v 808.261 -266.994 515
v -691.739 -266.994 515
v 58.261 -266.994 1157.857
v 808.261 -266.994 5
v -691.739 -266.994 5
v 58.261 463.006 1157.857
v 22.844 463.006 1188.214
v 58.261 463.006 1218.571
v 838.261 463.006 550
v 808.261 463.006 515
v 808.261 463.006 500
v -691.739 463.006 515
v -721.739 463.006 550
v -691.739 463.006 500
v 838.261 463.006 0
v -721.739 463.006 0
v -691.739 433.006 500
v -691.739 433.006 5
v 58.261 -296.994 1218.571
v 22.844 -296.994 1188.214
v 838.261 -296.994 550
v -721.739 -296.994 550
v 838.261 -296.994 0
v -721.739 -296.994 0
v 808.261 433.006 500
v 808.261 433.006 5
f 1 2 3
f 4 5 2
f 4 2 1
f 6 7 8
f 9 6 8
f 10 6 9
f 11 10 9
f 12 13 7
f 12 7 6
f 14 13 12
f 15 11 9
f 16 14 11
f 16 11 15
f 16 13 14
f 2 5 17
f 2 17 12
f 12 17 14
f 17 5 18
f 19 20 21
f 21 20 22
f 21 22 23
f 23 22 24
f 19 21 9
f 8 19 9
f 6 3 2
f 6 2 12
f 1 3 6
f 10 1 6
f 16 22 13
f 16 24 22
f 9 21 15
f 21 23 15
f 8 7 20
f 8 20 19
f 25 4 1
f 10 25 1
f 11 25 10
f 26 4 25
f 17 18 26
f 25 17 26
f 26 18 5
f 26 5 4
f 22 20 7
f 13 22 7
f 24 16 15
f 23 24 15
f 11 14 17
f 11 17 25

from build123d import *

# Parameters (mm, degrees)
SKETCH1_W           = 1560
SKETCH1_H           = 760
SKETCH1_W_2         = 1500
SKETCH1_H_2         = 700
BOSS_EXTRUDE1_DEPTH = 500
SKETCH2_W           = 1500
SKETCH2_H           = 700
BOSS_EXTRUDE2_DEPTH = 5
SKETCH5_W           = 30
SKETCH5_H           = 760
BOSS_EXTRUDE3_DEPTH = 50
CUT_EXTRUDE1_REACH  = 1260.086
SKETCH7_W           = 46.097722286
SKETCH7_H           = 760
BOSS_EXTRUDE4_DEPTH = 1709
SKETCH8_W           = 30
SKETCH8_H           = 760
BOSS_EXTRUDE5_DEPTH = 50
CUT_EXTRUDE2_REACH  = 2012.771
BOSS_EXTRUDE6_REACH = 2092.258
SKETCH11_W          = 46.097722286
SKETCH11_H          = 760
CUT_EXTRUDE4_DEPTH  = 1023
CUT_EXTRUDE5_DEPTH  = 1023
BOSS_EXTRUDE7_REACH = 1199.247
SKETCH14_W          = 1500
SKETCH14_H          = 30


with BuildPart() as part:
    # Sketch1 → Boss-Extrude1 (new body)
    with BuildSketch(Plane.XY):
        with Locations((58.260712741, 83.006069765)):
            Rectangle(SKETCH1_W, SKETCH1_H)
        with Locations((58.260712741, 83.006069765)):
            Rectangle(SKETCH1_W_2, SKETCH1_H_2, mode=Mode.SUBTRACT)
    extrude(amount=BOSS_EXTRUDE1_DEPTH)

    # Sketch2 → Boss-Extrude2 (add)
    with BuildSketch(Plane.XY):
        with Locations((58.260712741, 83.006069765)):
            Rectangle(SKETCH2_W, SKETCH2_H)
    extrude(amount=BOSS_EXTRUDE2_DEPTH)

    # Sketch5 → Boss-Extrude3 (add)
    with BuildSketch(Plane.XY.offset(500)):
        with Locations((823.260712741, 83.006069765)):
            Rectangle(SKETCH5_W, SKETCH5_H)
    extrude(amount=BOSS_EXTRUDE3_DEPTH)

    # Sketch6 → Cut-Extrude1 (cut, up to next)
    with BuildSketch(Plane(origin=(0, 463.006069765, 0), x_dir=(1, 0, 0), z_dir=(0, 1, 0)), mode=Mode.PRIVATE) as cut_extrude1_sk1:
        Polygon((838.260712741, -550), (808.260712741, -515), (808.260712741, -550), align=None)
    cut_extrude1_tool1 = extrude(cut_extrude1_sk1.sketch, amount=-CUT_EXTRUDE1_REACH, mode=Mode.PRIVATE) & part.part
    add(cut_extrude1_tool1.solids().sort_by_distance((818.260713, 463.00607, 538.333333))[0], mode=Mode.SUBTRACT)

    # Sketch7 → Boss-Extrude4 (add)
    with BuildSketch(Plane(origin=(211.467940286, 0, -181.258234531), x_dir=(0.6507913734559673, 0, 0.7592566023652978), z_dir=(-0.7592566023652978, 0, 0.6507913734559673))):
        with Locations((940.075110717, 83.006069765)):
            Rectangle(SKETCH7_W, SKETCH7_H)
    extrude(amount=BOSS_EXTRUDE4_DEPTH)

    # Sketch8 → Boss-Extrude5 (add)
    with BuildSketch(Plane.XY.offset(500)):
        with Locations((-706.739287259, 83.006069765)):
            Rectangle(SKETCH8_W, SKETCH8_H)
    extrude(amount=BOSS_EXTRUDE5_DEPTH)

    # Sketch10 → Cut-Extrude2 (cut, up to next)
    with BuildSketch(Plane(origin=(0, 463.006069765, 0), x_dir=(1, 0, 0), z_dir=(0, 1, 0)), mode=Mode.PRIVATE) as cut_extrude2_sk1:
        Polygon((-691.739287259, -550), (-691.739287259, -515), (-721.739287259, -550), align=None)
    cut_extrude2_tool1 = extrude(cut_extrude2_sk1.sketch, amount=-CUT_EXTRUDE2_REACH, mode=Mode.PRIVATE) & part.part
    add(cut_extrude2_tool1.solids().sort_by_distance((-701.739287, 463.00607, 538.333333))[0], mode=Mode.SUBTRACT)

    # Boss-Extrude6: up to this plane
    boss_extrude6_end = Plane(origin=(-489.308820701, 463.006069765, 1627.202457236), z_dir=(0.6507913734559673, 0, 0.7592566023652978))
    # Sketch11 → Boss-Extrude6 (add, up to the surface)
    with BuildSketch(Plane(origin=(-144.296765596, 0, -123.682941939), x_dir=(0.6507913734559686, 0, -0.7592566023652966), z_dir=(0.7592566023652966, 0, 0.6507913734559686)), mode=Mode.PRIVATE) as boss_extrude6_sk1:
        with Locations((-864.24397219, 83.006069765)):
            Rectangle(SKETCH11_W, SKETCH11_H)
    boss_extrude6_tool1 = split(extrude(boss_extrude6_sk1.sketch, amount=BOSS_EXTRUDE6_REACH, mode=Mode.PRIVATE), bisect_by=boss_extrude6_end, keep=Keep.BOTH, mode=Mode.PRIVATE)
    add(boss_extrude6_tool1.solids().sort_by_distance((-706.739287, 83.00607, 532.5))[0])

    # Sketch12 → Cut-Extrude4 (cut)
    with BuildSketch(Plane(origin=(0, 463.006069765, 0), x_dir=(1, 0, 0), z_dir=(0, 1, 0))):
        Polygon((55.536353767, -1220.906593407), (-459.308820701, -1662.202457236), (-489.308820701, -1627.202457236), (22.844046075, -1188.214285714), align=None)
    extrude(amount=-CUT_EXTRUDE4_DEPTH, mode=Mode.SUBTRACT)

    # Sketch13 → Cut-Extrude5 (cut)
    with BuildSketch(Plane(origin=(0, 463.006069765, 0), x_dir=(1, 0, 0), z_dir=(0, 1, 0))):
        Polygon((22.844046075, -1188.214285714), (58.260712741, -1218.571428571), (55.536353767, -1220.906593407), align=None)
    extrude(amount=-CUT_EXTRUDE5_DEPTH, mode=Mode.SUBTRACT)

    # Sketch14 → Boss-Extrude7 (add, up to next)
    with BuildSketch(Plane.XY.offset(500), mode=Mode.PRIVATE) as boss_extrude7_sk1:
        with Locations((58.260712741, -281.993930235)):
            Rectangle(SKETCH14_W, SKETCH14_H)
    boss_extrude7_tool1 = extrude(boss_extrude7_sk1.sketch, amount=BOSS_EXTRUDE7_REACH, mode=Mode.PRIVATE) - part.part
    add(boss_extrude7_tool1.solids().sort_by_distance((58.260713, -281.99393, 500))[0])


solid = part.part
